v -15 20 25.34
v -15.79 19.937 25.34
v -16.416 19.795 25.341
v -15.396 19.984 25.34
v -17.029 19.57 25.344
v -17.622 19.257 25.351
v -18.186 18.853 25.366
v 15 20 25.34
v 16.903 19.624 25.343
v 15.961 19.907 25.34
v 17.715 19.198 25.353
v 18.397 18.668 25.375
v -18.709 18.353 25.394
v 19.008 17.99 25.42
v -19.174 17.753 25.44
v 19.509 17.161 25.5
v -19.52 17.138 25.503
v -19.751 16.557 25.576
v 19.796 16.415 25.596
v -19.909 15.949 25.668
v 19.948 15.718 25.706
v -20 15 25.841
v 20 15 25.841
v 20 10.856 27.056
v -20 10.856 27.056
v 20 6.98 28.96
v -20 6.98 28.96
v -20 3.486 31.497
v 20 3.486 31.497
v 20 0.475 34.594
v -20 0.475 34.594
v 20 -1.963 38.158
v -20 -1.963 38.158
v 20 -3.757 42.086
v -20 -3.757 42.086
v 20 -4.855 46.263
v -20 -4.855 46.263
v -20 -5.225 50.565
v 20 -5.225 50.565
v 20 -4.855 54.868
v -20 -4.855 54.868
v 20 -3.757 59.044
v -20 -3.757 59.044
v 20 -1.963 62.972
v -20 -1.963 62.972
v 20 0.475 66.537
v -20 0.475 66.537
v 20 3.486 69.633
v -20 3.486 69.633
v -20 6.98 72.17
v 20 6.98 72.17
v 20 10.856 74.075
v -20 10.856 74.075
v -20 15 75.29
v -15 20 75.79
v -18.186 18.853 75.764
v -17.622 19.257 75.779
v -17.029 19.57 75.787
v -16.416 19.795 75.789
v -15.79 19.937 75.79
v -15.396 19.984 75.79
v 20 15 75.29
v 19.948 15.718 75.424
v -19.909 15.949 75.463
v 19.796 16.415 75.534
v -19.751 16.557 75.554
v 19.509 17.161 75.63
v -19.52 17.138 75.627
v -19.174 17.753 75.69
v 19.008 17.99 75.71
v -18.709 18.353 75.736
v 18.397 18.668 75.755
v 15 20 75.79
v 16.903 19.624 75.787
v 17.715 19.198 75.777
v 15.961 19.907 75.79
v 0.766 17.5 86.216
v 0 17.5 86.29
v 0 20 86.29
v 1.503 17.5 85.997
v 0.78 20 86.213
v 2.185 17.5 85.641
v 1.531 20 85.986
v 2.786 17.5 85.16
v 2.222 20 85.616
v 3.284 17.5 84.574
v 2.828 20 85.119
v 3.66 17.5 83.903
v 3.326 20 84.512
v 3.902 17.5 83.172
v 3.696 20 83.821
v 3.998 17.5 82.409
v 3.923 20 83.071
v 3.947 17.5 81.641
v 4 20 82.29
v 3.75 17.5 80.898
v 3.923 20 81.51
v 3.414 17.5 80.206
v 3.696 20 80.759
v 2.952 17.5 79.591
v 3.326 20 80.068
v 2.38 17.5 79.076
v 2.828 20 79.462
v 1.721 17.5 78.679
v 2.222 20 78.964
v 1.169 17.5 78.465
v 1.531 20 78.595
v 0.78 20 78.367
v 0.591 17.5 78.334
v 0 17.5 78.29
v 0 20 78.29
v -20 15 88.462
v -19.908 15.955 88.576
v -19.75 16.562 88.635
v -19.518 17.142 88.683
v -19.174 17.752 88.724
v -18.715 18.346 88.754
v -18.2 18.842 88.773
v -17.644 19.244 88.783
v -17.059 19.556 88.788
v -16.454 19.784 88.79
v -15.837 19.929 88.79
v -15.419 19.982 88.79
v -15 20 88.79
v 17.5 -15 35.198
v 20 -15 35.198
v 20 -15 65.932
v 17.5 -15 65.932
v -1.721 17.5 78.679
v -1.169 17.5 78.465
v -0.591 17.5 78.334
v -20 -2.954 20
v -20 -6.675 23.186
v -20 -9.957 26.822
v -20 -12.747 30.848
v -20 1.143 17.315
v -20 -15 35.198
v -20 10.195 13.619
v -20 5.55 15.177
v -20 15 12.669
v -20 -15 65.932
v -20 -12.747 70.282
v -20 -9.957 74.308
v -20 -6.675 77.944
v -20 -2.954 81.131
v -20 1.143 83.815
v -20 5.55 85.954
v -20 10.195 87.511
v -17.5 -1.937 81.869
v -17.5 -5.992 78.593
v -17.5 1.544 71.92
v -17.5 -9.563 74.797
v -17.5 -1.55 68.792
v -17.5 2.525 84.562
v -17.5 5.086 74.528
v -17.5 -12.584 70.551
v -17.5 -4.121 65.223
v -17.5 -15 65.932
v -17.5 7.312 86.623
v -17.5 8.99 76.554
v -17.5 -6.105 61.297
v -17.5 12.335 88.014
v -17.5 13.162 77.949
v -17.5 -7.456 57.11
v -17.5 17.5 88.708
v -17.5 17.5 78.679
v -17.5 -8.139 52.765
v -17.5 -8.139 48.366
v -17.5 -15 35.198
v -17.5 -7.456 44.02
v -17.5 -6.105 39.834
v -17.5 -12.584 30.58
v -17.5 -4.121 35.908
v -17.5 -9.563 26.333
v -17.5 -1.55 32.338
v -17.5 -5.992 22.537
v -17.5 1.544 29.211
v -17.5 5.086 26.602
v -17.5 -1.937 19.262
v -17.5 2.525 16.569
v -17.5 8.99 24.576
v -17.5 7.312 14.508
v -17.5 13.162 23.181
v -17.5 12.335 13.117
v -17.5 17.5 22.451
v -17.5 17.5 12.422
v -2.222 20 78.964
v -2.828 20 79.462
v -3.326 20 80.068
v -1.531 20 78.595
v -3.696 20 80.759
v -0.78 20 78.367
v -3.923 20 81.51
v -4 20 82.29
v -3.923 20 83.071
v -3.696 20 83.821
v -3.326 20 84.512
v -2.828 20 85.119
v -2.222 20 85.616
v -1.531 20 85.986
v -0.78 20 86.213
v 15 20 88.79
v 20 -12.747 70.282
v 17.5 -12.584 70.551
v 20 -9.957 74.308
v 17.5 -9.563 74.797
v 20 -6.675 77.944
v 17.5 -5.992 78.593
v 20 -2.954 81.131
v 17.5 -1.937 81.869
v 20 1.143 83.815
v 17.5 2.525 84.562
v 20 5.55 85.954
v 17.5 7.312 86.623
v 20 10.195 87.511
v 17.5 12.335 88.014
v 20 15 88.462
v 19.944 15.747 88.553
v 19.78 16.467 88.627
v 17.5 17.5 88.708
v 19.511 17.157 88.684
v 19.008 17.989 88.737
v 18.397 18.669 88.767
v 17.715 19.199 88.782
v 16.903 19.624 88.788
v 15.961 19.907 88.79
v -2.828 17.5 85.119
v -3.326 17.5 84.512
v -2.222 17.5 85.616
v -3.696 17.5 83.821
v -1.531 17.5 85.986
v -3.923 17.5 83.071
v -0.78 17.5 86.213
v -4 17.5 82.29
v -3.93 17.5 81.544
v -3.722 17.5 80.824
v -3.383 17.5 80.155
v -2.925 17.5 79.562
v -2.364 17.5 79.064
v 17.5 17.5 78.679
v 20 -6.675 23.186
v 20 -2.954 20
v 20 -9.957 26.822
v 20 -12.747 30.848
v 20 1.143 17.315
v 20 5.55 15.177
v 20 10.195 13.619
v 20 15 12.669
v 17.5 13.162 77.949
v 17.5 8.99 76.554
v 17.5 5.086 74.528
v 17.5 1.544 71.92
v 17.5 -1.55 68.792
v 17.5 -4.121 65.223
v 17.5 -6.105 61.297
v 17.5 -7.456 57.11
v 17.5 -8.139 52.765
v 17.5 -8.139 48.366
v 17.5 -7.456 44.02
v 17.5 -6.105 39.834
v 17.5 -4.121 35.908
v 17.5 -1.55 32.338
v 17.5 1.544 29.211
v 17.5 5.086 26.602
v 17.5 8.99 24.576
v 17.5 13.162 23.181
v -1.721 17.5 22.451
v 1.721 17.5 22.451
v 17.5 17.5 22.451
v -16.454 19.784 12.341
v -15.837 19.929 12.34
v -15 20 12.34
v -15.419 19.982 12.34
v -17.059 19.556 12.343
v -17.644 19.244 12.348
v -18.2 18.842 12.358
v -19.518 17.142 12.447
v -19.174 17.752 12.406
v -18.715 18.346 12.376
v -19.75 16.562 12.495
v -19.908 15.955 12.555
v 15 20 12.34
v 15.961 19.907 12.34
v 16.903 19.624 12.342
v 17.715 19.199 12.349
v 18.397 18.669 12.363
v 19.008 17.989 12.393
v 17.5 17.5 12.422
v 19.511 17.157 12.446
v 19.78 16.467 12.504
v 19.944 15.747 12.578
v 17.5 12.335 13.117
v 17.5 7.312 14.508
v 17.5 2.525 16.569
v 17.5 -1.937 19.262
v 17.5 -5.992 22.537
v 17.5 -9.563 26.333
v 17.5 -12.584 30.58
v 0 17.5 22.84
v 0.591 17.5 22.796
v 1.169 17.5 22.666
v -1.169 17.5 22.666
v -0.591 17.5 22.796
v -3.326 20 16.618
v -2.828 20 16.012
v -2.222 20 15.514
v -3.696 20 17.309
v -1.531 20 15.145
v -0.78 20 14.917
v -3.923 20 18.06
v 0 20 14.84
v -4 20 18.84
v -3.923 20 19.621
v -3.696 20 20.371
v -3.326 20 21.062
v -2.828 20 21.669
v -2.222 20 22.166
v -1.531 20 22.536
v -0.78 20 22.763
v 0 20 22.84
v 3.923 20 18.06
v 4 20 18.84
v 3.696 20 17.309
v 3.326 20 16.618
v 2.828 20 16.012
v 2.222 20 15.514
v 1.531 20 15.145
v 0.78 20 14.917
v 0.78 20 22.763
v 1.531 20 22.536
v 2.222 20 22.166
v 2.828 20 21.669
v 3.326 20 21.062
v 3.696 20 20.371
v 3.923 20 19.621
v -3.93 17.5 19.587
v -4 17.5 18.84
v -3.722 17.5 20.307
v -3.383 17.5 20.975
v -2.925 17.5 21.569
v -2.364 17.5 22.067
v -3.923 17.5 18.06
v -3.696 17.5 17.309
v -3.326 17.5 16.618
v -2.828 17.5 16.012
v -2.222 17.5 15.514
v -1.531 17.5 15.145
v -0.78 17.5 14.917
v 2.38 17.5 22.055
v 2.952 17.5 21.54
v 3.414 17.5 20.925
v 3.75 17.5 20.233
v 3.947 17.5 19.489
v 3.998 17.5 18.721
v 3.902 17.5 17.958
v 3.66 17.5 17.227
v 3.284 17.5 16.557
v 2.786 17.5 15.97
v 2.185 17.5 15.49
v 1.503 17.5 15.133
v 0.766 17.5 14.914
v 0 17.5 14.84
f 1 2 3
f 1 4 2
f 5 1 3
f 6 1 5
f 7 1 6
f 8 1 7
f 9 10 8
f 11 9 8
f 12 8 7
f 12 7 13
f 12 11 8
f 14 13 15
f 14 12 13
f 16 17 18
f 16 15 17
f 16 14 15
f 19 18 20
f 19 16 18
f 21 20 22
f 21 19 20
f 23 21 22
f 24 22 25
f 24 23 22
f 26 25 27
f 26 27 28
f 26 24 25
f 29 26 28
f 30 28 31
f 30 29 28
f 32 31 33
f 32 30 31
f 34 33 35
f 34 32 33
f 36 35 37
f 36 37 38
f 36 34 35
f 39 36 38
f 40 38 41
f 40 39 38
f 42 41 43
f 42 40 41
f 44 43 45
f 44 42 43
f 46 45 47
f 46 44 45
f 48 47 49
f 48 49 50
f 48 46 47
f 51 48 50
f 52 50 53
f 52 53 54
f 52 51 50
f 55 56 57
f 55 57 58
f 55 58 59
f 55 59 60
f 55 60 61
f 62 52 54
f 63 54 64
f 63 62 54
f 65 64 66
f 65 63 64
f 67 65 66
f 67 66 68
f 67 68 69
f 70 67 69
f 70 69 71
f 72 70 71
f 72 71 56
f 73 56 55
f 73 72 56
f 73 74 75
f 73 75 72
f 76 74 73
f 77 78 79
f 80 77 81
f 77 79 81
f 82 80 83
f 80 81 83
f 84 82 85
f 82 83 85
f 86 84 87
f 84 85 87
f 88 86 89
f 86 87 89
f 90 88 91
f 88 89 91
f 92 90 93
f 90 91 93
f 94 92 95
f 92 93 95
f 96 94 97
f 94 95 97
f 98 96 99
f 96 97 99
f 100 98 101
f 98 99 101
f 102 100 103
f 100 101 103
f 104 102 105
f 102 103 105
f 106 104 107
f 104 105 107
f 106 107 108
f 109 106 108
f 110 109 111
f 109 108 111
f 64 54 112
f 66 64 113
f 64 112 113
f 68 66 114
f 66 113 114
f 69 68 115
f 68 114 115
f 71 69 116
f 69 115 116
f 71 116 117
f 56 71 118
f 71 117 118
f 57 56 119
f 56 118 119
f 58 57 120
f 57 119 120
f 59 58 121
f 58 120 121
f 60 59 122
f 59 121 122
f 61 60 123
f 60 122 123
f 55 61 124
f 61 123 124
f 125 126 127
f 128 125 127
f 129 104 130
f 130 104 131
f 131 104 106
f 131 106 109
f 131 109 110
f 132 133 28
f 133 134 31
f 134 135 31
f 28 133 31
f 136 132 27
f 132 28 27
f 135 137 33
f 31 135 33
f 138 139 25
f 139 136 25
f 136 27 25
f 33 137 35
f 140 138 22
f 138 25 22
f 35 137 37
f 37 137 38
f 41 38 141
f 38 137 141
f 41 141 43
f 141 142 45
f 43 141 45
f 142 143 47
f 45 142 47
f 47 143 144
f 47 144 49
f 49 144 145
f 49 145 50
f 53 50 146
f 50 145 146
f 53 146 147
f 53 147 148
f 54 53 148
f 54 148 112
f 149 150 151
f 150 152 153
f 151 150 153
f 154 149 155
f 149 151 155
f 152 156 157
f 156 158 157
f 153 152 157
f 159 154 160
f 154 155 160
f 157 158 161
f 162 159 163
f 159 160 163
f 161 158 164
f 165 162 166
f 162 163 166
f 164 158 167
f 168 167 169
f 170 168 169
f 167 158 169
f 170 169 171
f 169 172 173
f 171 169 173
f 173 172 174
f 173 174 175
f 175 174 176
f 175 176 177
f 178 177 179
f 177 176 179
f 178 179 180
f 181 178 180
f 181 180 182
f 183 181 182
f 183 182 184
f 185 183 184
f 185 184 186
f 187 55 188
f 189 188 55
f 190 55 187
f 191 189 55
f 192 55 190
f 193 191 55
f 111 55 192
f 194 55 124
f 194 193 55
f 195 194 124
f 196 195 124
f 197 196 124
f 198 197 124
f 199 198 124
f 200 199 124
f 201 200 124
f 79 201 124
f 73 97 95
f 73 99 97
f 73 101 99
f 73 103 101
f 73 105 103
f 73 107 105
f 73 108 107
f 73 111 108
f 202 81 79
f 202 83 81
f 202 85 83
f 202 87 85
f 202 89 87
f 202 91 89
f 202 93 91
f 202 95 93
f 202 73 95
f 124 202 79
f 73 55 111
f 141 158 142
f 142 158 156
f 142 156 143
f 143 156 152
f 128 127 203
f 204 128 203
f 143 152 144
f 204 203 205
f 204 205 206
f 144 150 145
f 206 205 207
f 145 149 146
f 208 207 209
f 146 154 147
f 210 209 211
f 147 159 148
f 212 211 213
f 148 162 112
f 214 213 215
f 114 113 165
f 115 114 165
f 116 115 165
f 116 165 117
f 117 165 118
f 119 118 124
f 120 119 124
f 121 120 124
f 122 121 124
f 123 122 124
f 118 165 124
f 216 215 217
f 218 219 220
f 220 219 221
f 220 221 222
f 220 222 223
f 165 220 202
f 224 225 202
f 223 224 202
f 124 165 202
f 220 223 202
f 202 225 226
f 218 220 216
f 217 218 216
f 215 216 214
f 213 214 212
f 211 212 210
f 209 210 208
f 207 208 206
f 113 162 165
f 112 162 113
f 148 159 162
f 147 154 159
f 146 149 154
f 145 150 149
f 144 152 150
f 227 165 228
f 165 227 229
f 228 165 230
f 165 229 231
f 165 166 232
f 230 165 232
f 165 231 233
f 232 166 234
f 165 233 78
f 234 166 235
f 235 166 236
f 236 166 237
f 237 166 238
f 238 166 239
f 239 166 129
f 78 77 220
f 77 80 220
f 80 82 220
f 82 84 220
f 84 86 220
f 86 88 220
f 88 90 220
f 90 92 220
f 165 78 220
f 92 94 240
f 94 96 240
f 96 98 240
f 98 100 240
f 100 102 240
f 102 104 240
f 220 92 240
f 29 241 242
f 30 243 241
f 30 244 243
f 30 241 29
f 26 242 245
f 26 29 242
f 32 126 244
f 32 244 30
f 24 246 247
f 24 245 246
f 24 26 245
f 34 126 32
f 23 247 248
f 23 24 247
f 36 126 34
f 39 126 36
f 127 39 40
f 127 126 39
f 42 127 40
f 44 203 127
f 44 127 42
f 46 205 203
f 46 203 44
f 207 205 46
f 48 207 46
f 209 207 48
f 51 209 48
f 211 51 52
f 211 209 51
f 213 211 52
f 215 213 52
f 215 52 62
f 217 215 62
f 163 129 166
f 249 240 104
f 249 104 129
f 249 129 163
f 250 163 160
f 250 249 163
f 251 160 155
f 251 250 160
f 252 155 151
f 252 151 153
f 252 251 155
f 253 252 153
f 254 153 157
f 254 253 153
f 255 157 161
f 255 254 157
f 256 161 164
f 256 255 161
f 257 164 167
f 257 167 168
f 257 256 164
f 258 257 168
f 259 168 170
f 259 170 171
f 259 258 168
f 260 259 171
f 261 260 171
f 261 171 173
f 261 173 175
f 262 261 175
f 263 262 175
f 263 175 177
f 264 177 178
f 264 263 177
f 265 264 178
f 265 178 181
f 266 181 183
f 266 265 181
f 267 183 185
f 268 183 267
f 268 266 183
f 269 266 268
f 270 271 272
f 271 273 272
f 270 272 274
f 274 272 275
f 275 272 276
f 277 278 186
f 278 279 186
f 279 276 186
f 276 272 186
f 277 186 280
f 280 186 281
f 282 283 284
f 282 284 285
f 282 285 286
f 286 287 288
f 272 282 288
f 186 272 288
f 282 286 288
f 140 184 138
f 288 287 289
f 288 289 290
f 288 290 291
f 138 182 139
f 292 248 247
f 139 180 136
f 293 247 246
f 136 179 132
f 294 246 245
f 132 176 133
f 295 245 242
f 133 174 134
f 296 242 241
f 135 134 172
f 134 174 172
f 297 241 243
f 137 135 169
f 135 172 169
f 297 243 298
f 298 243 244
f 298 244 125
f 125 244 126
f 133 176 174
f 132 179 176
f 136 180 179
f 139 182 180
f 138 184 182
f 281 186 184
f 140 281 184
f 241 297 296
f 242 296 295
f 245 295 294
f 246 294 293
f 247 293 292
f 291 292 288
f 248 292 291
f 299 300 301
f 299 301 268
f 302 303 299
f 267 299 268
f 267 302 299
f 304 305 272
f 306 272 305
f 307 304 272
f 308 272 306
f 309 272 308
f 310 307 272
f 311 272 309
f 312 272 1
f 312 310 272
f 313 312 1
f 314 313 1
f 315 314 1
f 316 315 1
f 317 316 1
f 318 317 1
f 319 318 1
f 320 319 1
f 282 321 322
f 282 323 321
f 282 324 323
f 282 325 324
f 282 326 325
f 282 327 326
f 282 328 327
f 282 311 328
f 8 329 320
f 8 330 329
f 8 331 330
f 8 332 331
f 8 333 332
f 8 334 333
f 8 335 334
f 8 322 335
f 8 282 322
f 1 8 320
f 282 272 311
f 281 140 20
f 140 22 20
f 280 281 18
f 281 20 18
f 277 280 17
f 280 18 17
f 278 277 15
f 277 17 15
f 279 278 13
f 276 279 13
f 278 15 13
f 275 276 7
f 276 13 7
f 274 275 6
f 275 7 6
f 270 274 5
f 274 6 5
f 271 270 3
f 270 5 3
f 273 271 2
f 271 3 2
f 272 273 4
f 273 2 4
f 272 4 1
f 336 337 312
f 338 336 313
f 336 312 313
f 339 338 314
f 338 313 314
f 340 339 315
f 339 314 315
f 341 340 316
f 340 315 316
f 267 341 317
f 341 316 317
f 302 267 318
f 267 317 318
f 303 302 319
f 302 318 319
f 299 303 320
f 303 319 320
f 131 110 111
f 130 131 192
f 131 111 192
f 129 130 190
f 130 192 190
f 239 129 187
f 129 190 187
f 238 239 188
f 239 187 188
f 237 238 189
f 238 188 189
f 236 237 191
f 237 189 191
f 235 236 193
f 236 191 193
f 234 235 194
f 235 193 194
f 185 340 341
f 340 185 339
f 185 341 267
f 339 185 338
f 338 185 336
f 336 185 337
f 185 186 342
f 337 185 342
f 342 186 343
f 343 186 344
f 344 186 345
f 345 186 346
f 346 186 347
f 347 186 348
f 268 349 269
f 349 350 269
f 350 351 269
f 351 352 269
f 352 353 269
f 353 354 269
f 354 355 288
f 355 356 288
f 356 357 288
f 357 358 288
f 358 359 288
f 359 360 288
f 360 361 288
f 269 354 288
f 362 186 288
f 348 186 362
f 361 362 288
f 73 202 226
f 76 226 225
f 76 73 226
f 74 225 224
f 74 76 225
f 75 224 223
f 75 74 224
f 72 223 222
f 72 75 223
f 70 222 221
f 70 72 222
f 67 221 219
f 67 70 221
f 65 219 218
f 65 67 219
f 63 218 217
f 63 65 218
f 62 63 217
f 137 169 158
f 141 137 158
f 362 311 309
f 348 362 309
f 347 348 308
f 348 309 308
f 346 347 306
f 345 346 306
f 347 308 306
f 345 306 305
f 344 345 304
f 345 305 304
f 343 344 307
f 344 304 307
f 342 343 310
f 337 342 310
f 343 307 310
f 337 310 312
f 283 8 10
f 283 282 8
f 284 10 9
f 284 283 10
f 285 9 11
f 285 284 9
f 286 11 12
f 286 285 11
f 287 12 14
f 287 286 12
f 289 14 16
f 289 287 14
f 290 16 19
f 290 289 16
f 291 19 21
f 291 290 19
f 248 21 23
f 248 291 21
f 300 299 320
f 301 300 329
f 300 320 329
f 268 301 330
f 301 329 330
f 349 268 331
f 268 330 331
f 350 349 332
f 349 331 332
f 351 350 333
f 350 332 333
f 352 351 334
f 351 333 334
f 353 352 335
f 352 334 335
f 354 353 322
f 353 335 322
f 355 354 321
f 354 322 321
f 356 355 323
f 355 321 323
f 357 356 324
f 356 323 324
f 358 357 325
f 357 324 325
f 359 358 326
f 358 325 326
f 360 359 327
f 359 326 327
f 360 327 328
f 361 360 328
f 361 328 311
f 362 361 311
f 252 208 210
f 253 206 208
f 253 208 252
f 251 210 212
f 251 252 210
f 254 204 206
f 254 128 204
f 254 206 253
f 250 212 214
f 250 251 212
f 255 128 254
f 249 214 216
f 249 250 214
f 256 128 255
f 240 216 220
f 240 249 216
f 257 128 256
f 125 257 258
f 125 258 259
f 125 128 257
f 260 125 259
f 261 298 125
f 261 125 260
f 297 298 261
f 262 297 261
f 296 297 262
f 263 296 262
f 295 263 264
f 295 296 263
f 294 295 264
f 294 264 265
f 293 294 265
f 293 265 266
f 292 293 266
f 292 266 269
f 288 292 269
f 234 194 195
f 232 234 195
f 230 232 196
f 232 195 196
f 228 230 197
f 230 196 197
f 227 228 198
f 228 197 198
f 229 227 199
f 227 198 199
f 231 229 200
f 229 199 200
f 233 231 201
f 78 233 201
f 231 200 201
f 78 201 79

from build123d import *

# Parameters (mm, degrees)
F0_W      = 40
F0_H      = 40
F0_W_2    = 35
F0_H_2    = 35
F1_DEPTH  = 100
F3_DEPTH  = 40.001
F4_DEPTH  = 40
F5_R      = 5
F6_DEPTH  = 40
F7_R      = 5
F9_DEPTH  = 2.5
F11_DEPTH = 2.5


# Not quite as in the source:
# - a feature names something its author has since deleted; it is built from what else it names


with BuildPart() as f1:
    # F0 (on Top) → F1 (new body)
    with BuildSketch(Plane.XY):
        Rectangle(F0_W, F0_H)
        Rectangle(F0_W_2, F0_H_2, mode=Mode.SUBTRACT)
    extrude(amount=F1_DEPTH)

    # F2 (on face) → F3 (cut, through all)
    with BuildSketch(Plane.YZ.offset(20)):
        with BuildLine():
            Line((20, 25.3402171373), (20, 75.7902171373))
            ThreePointArc((20, 75.7902171373), (-5.225, 50.5652171373), (20, 25.3402171373))
        make_face()
        with BuildLine():
            ThreePointArc((20, 25.3402171373), (-5.225, 50.5652171373), (20, 75.7902171373))
            Line((20, 75.7902171373), (20, 78.7902171373))
            ThreePointArc((20, 78.7902171373), (-8.225, 50.5652171373), (20, 22.3402171373))
            Line((20, 22.3402171373), (20, 25.3402171373))
        make_face()
    extrude(amount=-F3_DEPTH, mode=Mode.SUBTRACT)

    # F2 (on face) → F4 (join)
    with BuildSketch(Plane.YZ.offset(20)):
        with BuildLine():
            ThreePointArc((20, 25.3402171373), (-5.225, 50.5652171373), (20, 75.7902171373))
            Line((20, 75.7902171373), (20, 78.7902171373))
            ThreePointArc((20, 78.7902171373), (-8.225, 50.5652171373), (20, 22.3402171373))
            Line((20, 22.3402171373), (20, 25.3402171373))
        make_face()
    extrude(amount=-F4_DEPTH)

    # F5
    f5_edges = [f1.edges().sort_by_distance(p)[0] for p in [
        (-20, -20, 50),
        (20, -20, 50),
    ]]
    fillet(f5_edges, radius=F5_R)

    # F2 (on face) → F6 (cut)
    with BuildSketch(Plane.YZ.offset(20)):
        with BuildLine():
            ThreePointArc((-15, 65.9324102773), (-0.9014313771, 82.569604202), (20, 88.7902171373))
            Line((20, 88.7902171373), (20, 100))
            Line((20, 100), (-20, 100))
            Line((-20, 100), (-20, 70.5652171373))
            Line((-20, 70.5652171373), (-20, 30.5652171373))
            Line((-20, 30.5652171373), (-20, 0))
            Line((-20, 0), (20, 0))
            Line((20, 0), (20, 12.3402171373))
            ThreePointArc((20, 12.3402171373), (-0.9014313771, 18.5608300726), (-15, 35.1980239974))
            Line((-15, 35.1980239974), (-15, 65.9324102773))
        make_face()
    extrude(amount=-F6_DEPTH, mode=Mode.SUBTRACT)

    # F7
    f7_edges = [f1.edges().sort_by_distance(p)[0] for p in [
        (-20, 20, 82.290217),
        (20, 20, 82.290217),
        (-20, 20, 18.840217),
        (20, 20, 18.840217),
    ]]
    fillet(f7_edges, radius=F7_R)

    # F8 (on face) → F9 (cut)
    with BuildSketch(Plane(origin=(0, 20, 0), x_dir=(-1, 0, 0), z_dir=(0, 1, 0))):
        with BuildLine():
            ThreePointArc((0, 86.2902171373), (-4, 82.2902171373), (0, 78.2902171373))
            Line((0, 78.2902171373), (0, 86.2902171373))
        make_face()
        with BuildLine():
            Line((0, 86.2902171373), (0, 78.2902171373))
            ThreePointArc((0, 78.2902171373), (2.8284271247, 79.4617900126), (4, 82.2902171373))
            ThreePointArc((4, 82.2902171373), (2.8284271247, 85.1186442621), (0, 86.2902171373))
        make_face()
    extrude(amount=-F9_DEPTH, mode=Mode.SUBTRACT)

    # F10 (on face) → F11 (cut)
    with BuildSketch(Plane(origin=(0, 20, 0), x_dir=(-1, 0, 0), z_dir=(0, 1, 0))):
        with BuildLine():
            ThreePointArc((0, 22.8402171373), (-4, 18.8402171373), (0, 14.8402171373))
            Line((0, 14.8402171373), (0, 22.8402171373))
        make_face()
        with BuildLine():
            Line((0, 22.8402171373), (0, 14.8402171373))
            ThreePointArc((0, 14.8402171373), (2.8284271247, 16.0117900126), (4, 18.8402171373))
            ThreePointArc((4, 18.8402171373), (2.8284271247, 21.6686442621), (0, 22.8402171373))
        make_face()
    extrude(amount=-F11_DEPTH, mode=Mode.SUBTRACT)


solid = f1.part
